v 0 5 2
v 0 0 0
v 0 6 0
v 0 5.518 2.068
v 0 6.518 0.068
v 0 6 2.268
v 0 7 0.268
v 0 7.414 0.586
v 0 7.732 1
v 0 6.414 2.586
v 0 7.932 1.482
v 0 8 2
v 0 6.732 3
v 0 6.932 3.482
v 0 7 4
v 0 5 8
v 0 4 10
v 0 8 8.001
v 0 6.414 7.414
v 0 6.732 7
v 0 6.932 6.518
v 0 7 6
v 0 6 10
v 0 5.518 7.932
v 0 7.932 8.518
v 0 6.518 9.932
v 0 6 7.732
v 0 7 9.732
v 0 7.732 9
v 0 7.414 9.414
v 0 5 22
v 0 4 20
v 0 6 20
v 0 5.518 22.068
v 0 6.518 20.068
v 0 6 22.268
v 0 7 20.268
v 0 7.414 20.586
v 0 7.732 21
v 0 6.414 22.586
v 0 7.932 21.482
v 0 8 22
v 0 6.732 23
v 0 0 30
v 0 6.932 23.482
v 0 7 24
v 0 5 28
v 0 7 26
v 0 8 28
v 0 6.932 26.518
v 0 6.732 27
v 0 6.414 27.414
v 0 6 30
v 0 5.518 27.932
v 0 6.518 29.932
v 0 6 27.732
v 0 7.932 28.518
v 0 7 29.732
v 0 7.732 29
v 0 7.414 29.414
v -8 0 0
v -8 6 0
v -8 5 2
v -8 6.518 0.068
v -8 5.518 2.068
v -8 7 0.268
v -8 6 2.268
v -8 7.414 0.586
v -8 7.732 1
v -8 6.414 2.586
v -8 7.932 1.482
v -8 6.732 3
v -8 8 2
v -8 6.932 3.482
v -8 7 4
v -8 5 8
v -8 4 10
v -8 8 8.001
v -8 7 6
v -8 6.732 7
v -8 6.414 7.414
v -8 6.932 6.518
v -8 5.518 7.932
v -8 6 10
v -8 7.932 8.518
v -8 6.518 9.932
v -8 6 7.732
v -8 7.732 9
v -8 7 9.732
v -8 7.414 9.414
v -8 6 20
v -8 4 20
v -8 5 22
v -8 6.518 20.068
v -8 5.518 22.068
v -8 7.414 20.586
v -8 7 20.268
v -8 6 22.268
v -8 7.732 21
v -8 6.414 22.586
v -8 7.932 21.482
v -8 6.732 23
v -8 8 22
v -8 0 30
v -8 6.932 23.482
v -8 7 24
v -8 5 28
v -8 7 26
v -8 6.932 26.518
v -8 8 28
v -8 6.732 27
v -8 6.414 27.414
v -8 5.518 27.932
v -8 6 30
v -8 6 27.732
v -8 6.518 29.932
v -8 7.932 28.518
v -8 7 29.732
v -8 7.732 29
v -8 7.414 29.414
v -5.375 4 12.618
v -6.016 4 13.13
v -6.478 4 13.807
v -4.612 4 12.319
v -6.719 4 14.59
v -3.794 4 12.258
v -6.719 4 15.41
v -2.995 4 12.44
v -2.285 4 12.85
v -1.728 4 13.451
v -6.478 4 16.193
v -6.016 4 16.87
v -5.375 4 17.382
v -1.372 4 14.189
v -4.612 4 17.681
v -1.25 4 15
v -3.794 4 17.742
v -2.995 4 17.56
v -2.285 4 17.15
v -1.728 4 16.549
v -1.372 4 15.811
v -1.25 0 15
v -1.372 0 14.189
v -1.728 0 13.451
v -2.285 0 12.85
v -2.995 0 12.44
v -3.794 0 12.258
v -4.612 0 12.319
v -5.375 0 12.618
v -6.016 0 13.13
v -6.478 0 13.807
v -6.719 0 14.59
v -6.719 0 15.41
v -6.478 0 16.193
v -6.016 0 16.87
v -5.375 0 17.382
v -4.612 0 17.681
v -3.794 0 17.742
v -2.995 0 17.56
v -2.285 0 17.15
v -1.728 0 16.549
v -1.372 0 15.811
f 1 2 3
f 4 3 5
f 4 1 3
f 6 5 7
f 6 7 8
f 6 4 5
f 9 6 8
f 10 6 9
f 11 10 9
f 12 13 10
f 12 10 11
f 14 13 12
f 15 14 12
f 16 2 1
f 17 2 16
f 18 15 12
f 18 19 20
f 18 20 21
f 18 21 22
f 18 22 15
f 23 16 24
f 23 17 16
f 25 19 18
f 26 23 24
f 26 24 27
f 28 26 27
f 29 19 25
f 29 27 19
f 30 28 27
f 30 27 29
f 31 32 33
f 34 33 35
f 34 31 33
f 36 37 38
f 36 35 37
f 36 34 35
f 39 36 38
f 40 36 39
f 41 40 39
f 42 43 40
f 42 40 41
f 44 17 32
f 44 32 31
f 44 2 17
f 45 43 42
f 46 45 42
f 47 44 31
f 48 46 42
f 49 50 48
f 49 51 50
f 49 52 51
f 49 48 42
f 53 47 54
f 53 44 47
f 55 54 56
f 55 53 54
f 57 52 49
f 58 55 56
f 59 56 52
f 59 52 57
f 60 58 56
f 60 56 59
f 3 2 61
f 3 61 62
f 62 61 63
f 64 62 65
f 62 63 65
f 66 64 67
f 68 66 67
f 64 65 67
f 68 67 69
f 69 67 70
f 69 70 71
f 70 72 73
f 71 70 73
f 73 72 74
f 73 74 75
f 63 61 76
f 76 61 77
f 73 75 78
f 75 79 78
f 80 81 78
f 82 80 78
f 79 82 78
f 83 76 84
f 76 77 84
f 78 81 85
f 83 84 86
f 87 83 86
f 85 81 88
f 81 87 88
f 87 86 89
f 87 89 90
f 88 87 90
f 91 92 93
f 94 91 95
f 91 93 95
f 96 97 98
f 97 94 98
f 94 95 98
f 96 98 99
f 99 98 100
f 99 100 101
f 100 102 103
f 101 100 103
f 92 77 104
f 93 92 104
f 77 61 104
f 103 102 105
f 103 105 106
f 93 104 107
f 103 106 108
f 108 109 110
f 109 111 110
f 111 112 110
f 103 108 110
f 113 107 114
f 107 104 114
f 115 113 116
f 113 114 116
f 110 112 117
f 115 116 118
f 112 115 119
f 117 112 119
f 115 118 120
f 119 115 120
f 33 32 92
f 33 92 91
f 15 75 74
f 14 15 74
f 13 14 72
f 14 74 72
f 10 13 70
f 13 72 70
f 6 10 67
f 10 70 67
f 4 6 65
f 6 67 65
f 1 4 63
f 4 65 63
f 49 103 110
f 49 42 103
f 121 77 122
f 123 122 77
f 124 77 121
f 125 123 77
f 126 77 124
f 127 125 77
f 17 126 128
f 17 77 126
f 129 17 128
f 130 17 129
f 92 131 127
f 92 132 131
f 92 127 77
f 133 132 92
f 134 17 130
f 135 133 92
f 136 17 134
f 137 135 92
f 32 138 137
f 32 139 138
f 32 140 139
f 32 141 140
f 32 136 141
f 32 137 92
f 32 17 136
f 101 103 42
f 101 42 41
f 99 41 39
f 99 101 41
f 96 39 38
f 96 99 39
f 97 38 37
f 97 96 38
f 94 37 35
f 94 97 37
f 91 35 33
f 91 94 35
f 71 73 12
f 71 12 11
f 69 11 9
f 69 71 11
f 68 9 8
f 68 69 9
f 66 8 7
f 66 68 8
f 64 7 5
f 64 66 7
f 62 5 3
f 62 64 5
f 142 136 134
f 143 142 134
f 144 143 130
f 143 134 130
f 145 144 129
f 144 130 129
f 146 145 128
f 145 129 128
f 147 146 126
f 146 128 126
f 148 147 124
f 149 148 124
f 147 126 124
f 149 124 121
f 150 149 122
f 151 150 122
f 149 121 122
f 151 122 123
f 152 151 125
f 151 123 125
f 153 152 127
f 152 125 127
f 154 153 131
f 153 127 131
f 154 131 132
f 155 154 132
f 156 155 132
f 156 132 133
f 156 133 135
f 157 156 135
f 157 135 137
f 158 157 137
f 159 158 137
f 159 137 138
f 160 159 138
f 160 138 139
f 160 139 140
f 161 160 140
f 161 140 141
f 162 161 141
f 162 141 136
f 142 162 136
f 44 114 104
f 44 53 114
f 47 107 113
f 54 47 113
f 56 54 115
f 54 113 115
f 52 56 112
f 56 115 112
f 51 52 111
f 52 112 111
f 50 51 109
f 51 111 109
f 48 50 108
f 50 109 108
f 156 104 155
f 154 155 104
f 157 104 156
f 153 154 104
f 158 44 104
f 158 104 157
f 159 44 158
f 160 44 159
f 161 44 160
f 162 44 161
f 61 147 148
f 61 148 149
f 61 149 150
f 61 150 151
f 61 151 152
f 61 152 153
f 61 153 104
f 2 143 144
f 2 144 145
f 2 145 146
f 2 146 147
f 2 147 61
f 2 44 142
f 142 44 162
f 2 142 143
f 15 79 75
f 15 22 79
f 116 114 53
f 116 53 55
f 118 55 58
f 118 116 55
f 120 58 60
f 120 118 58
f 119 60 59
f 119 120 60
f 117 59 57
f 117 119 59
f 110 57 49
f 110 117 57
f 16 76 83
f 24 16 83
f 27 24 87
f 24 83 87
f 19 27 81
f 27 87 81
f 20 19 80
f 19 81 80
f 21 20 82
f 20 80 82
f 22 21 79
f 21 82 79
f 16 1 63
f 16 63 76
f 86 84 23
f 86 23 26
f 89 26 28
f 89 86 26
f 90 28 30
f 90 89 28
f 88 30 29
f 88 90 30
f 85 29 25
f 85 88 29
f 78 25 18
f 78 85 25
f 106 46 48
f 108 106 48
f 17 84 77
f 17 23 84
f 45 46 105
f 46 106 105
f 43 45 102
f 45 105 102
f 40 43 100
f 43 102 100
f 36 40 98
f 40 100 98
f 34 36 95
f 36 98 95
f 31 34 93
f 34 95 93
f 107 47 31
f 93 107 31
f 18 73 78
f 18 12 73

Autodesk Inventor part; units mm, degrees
ref_plane "YZ Plane" through (0, 0, 0) normal (1, 0, 0) x (0, 1, 0)
ref_plane "XZ Plane" through (0, 0, 0) normal (0, 1, 0) x (-1, 0, 0)
ref_plane "XY Plane" through (0, 0, 0) normal (0, 0, 1) x (1, 0, 0)
sketch "Sketch1" plane through (0, 0, 0) normal (1, 0, 0) x (0, 1, 0)
  line L0 (0, 0) -> (8, 0)
  line L1 (8, 0) -> (8, 30)
  line L2 (8, 30) -> (0, 30)
  line L3 (0, 30) -> (0, 0)
  line L4 (8, 10) -> (4, 10)
  line L5 (4, 10) -> (4, 20)
  line L6 (4, 20) -> (8, 20)
  line L7 (8, 20) -> (8, 10)
  dimension "d0" = 8
  dimension "d1" = 30
  dimension "d2" = 4
  dimension "d3" = 10
  dimension "d4" = 10
extrude "Extrusion1" add sketch "Sketch1" against normal blind 8 contours L3 L2 L1 L6 L5 L4 L0
sketch "Sketch2" plane through (0, 4, 20) normal (0, 1, 0) x (1, 0, 0)
  line L0 (0, 10) -> (0, 0) projected
  line L1 (0, 10) -> (-8, 10) projected
  line L2 (-8, 0) -> (-8, 10) projected
  line L3 (0, 0) -> (-8, 0) projected
  line L4 (-8, 0) -> (0, 10) construction
  line L5 (-8, 10) -> (0, 0) construction
  circle A0 centre (-4, 5) radius 2.75
  point P0 (0, 20)
  dimension "d7" = 5.5
extrude "Extrusion2" cut sketch "Sketch2" against normal up to next contours A0
sketch "Sketch3" plane through (0, 0, 0) normal (1, 0, 0) x (0, 0, -1)
  line L0 (0, 8) -> (-10, 8) projected
  line L1 (-10, 8) -> (-10, 4) projected
  line L2 (-10, 4) -> (-20, 4) projected
  line L3 (-20, 4) -> (-20, 8) projected
  line L4 (-20, 8) -> (-30, 8) projected
  line L5 (-30, 8) -> (-30, 0) projected
  line L6 (-30, 0) -> (0, 0) projected
  line L7 (0, 0) -> (0, 8) projected
  line L8 (-8, 7) -> (-2, 7)
  line L9 (-2, 7) -> (-2, 5)
  line L10 (-2, 5) -> (-8, 5)
  line L11 (-8, 5) -> (-8, 7)
  line L12 (-20, 4) -> (-10, 4) construction
  line L13 (-15, 4) -> (-15, 8) construction
  line L14 (-22, 7) -> (-28, 7)
  line L15 (-28, 7) -> (-28, 5)
  line L16 (-28, 5) -> (-22, 5)
  line L17 (-22, 5) -> (-22, 7)
  dimension "d10" = 6
  dimension "d11" = 2
  dimension "d12" = 10
  dimension "d13" = 2
  dimension "d14" = 4
  dimension "d15" = 1
extrude "Extrusion3" cut sketch "Sketch3" against normal up to next contours L8 L9 L10 L11 | L17 L16 L15 L14
fillet "Fillet1" radius 2 8 edges at (-4, 8, 10) (-4, 8, 20) (-4, 8, 30) (-4, 8, 0) (-4, 7, 28) (-4, 7, 22) (-4, 7, 8) (-4, 7, 2)
equation "\"d4\" = -0.5 * d3 + 0.5 * d1"
equation "\"d13\" = -0.5 * d10 + 0.5 * d12"
equation "\"d15\" = -0.5 * d11 + 0.5 * d14"
properties part number "Wire Anchor"
